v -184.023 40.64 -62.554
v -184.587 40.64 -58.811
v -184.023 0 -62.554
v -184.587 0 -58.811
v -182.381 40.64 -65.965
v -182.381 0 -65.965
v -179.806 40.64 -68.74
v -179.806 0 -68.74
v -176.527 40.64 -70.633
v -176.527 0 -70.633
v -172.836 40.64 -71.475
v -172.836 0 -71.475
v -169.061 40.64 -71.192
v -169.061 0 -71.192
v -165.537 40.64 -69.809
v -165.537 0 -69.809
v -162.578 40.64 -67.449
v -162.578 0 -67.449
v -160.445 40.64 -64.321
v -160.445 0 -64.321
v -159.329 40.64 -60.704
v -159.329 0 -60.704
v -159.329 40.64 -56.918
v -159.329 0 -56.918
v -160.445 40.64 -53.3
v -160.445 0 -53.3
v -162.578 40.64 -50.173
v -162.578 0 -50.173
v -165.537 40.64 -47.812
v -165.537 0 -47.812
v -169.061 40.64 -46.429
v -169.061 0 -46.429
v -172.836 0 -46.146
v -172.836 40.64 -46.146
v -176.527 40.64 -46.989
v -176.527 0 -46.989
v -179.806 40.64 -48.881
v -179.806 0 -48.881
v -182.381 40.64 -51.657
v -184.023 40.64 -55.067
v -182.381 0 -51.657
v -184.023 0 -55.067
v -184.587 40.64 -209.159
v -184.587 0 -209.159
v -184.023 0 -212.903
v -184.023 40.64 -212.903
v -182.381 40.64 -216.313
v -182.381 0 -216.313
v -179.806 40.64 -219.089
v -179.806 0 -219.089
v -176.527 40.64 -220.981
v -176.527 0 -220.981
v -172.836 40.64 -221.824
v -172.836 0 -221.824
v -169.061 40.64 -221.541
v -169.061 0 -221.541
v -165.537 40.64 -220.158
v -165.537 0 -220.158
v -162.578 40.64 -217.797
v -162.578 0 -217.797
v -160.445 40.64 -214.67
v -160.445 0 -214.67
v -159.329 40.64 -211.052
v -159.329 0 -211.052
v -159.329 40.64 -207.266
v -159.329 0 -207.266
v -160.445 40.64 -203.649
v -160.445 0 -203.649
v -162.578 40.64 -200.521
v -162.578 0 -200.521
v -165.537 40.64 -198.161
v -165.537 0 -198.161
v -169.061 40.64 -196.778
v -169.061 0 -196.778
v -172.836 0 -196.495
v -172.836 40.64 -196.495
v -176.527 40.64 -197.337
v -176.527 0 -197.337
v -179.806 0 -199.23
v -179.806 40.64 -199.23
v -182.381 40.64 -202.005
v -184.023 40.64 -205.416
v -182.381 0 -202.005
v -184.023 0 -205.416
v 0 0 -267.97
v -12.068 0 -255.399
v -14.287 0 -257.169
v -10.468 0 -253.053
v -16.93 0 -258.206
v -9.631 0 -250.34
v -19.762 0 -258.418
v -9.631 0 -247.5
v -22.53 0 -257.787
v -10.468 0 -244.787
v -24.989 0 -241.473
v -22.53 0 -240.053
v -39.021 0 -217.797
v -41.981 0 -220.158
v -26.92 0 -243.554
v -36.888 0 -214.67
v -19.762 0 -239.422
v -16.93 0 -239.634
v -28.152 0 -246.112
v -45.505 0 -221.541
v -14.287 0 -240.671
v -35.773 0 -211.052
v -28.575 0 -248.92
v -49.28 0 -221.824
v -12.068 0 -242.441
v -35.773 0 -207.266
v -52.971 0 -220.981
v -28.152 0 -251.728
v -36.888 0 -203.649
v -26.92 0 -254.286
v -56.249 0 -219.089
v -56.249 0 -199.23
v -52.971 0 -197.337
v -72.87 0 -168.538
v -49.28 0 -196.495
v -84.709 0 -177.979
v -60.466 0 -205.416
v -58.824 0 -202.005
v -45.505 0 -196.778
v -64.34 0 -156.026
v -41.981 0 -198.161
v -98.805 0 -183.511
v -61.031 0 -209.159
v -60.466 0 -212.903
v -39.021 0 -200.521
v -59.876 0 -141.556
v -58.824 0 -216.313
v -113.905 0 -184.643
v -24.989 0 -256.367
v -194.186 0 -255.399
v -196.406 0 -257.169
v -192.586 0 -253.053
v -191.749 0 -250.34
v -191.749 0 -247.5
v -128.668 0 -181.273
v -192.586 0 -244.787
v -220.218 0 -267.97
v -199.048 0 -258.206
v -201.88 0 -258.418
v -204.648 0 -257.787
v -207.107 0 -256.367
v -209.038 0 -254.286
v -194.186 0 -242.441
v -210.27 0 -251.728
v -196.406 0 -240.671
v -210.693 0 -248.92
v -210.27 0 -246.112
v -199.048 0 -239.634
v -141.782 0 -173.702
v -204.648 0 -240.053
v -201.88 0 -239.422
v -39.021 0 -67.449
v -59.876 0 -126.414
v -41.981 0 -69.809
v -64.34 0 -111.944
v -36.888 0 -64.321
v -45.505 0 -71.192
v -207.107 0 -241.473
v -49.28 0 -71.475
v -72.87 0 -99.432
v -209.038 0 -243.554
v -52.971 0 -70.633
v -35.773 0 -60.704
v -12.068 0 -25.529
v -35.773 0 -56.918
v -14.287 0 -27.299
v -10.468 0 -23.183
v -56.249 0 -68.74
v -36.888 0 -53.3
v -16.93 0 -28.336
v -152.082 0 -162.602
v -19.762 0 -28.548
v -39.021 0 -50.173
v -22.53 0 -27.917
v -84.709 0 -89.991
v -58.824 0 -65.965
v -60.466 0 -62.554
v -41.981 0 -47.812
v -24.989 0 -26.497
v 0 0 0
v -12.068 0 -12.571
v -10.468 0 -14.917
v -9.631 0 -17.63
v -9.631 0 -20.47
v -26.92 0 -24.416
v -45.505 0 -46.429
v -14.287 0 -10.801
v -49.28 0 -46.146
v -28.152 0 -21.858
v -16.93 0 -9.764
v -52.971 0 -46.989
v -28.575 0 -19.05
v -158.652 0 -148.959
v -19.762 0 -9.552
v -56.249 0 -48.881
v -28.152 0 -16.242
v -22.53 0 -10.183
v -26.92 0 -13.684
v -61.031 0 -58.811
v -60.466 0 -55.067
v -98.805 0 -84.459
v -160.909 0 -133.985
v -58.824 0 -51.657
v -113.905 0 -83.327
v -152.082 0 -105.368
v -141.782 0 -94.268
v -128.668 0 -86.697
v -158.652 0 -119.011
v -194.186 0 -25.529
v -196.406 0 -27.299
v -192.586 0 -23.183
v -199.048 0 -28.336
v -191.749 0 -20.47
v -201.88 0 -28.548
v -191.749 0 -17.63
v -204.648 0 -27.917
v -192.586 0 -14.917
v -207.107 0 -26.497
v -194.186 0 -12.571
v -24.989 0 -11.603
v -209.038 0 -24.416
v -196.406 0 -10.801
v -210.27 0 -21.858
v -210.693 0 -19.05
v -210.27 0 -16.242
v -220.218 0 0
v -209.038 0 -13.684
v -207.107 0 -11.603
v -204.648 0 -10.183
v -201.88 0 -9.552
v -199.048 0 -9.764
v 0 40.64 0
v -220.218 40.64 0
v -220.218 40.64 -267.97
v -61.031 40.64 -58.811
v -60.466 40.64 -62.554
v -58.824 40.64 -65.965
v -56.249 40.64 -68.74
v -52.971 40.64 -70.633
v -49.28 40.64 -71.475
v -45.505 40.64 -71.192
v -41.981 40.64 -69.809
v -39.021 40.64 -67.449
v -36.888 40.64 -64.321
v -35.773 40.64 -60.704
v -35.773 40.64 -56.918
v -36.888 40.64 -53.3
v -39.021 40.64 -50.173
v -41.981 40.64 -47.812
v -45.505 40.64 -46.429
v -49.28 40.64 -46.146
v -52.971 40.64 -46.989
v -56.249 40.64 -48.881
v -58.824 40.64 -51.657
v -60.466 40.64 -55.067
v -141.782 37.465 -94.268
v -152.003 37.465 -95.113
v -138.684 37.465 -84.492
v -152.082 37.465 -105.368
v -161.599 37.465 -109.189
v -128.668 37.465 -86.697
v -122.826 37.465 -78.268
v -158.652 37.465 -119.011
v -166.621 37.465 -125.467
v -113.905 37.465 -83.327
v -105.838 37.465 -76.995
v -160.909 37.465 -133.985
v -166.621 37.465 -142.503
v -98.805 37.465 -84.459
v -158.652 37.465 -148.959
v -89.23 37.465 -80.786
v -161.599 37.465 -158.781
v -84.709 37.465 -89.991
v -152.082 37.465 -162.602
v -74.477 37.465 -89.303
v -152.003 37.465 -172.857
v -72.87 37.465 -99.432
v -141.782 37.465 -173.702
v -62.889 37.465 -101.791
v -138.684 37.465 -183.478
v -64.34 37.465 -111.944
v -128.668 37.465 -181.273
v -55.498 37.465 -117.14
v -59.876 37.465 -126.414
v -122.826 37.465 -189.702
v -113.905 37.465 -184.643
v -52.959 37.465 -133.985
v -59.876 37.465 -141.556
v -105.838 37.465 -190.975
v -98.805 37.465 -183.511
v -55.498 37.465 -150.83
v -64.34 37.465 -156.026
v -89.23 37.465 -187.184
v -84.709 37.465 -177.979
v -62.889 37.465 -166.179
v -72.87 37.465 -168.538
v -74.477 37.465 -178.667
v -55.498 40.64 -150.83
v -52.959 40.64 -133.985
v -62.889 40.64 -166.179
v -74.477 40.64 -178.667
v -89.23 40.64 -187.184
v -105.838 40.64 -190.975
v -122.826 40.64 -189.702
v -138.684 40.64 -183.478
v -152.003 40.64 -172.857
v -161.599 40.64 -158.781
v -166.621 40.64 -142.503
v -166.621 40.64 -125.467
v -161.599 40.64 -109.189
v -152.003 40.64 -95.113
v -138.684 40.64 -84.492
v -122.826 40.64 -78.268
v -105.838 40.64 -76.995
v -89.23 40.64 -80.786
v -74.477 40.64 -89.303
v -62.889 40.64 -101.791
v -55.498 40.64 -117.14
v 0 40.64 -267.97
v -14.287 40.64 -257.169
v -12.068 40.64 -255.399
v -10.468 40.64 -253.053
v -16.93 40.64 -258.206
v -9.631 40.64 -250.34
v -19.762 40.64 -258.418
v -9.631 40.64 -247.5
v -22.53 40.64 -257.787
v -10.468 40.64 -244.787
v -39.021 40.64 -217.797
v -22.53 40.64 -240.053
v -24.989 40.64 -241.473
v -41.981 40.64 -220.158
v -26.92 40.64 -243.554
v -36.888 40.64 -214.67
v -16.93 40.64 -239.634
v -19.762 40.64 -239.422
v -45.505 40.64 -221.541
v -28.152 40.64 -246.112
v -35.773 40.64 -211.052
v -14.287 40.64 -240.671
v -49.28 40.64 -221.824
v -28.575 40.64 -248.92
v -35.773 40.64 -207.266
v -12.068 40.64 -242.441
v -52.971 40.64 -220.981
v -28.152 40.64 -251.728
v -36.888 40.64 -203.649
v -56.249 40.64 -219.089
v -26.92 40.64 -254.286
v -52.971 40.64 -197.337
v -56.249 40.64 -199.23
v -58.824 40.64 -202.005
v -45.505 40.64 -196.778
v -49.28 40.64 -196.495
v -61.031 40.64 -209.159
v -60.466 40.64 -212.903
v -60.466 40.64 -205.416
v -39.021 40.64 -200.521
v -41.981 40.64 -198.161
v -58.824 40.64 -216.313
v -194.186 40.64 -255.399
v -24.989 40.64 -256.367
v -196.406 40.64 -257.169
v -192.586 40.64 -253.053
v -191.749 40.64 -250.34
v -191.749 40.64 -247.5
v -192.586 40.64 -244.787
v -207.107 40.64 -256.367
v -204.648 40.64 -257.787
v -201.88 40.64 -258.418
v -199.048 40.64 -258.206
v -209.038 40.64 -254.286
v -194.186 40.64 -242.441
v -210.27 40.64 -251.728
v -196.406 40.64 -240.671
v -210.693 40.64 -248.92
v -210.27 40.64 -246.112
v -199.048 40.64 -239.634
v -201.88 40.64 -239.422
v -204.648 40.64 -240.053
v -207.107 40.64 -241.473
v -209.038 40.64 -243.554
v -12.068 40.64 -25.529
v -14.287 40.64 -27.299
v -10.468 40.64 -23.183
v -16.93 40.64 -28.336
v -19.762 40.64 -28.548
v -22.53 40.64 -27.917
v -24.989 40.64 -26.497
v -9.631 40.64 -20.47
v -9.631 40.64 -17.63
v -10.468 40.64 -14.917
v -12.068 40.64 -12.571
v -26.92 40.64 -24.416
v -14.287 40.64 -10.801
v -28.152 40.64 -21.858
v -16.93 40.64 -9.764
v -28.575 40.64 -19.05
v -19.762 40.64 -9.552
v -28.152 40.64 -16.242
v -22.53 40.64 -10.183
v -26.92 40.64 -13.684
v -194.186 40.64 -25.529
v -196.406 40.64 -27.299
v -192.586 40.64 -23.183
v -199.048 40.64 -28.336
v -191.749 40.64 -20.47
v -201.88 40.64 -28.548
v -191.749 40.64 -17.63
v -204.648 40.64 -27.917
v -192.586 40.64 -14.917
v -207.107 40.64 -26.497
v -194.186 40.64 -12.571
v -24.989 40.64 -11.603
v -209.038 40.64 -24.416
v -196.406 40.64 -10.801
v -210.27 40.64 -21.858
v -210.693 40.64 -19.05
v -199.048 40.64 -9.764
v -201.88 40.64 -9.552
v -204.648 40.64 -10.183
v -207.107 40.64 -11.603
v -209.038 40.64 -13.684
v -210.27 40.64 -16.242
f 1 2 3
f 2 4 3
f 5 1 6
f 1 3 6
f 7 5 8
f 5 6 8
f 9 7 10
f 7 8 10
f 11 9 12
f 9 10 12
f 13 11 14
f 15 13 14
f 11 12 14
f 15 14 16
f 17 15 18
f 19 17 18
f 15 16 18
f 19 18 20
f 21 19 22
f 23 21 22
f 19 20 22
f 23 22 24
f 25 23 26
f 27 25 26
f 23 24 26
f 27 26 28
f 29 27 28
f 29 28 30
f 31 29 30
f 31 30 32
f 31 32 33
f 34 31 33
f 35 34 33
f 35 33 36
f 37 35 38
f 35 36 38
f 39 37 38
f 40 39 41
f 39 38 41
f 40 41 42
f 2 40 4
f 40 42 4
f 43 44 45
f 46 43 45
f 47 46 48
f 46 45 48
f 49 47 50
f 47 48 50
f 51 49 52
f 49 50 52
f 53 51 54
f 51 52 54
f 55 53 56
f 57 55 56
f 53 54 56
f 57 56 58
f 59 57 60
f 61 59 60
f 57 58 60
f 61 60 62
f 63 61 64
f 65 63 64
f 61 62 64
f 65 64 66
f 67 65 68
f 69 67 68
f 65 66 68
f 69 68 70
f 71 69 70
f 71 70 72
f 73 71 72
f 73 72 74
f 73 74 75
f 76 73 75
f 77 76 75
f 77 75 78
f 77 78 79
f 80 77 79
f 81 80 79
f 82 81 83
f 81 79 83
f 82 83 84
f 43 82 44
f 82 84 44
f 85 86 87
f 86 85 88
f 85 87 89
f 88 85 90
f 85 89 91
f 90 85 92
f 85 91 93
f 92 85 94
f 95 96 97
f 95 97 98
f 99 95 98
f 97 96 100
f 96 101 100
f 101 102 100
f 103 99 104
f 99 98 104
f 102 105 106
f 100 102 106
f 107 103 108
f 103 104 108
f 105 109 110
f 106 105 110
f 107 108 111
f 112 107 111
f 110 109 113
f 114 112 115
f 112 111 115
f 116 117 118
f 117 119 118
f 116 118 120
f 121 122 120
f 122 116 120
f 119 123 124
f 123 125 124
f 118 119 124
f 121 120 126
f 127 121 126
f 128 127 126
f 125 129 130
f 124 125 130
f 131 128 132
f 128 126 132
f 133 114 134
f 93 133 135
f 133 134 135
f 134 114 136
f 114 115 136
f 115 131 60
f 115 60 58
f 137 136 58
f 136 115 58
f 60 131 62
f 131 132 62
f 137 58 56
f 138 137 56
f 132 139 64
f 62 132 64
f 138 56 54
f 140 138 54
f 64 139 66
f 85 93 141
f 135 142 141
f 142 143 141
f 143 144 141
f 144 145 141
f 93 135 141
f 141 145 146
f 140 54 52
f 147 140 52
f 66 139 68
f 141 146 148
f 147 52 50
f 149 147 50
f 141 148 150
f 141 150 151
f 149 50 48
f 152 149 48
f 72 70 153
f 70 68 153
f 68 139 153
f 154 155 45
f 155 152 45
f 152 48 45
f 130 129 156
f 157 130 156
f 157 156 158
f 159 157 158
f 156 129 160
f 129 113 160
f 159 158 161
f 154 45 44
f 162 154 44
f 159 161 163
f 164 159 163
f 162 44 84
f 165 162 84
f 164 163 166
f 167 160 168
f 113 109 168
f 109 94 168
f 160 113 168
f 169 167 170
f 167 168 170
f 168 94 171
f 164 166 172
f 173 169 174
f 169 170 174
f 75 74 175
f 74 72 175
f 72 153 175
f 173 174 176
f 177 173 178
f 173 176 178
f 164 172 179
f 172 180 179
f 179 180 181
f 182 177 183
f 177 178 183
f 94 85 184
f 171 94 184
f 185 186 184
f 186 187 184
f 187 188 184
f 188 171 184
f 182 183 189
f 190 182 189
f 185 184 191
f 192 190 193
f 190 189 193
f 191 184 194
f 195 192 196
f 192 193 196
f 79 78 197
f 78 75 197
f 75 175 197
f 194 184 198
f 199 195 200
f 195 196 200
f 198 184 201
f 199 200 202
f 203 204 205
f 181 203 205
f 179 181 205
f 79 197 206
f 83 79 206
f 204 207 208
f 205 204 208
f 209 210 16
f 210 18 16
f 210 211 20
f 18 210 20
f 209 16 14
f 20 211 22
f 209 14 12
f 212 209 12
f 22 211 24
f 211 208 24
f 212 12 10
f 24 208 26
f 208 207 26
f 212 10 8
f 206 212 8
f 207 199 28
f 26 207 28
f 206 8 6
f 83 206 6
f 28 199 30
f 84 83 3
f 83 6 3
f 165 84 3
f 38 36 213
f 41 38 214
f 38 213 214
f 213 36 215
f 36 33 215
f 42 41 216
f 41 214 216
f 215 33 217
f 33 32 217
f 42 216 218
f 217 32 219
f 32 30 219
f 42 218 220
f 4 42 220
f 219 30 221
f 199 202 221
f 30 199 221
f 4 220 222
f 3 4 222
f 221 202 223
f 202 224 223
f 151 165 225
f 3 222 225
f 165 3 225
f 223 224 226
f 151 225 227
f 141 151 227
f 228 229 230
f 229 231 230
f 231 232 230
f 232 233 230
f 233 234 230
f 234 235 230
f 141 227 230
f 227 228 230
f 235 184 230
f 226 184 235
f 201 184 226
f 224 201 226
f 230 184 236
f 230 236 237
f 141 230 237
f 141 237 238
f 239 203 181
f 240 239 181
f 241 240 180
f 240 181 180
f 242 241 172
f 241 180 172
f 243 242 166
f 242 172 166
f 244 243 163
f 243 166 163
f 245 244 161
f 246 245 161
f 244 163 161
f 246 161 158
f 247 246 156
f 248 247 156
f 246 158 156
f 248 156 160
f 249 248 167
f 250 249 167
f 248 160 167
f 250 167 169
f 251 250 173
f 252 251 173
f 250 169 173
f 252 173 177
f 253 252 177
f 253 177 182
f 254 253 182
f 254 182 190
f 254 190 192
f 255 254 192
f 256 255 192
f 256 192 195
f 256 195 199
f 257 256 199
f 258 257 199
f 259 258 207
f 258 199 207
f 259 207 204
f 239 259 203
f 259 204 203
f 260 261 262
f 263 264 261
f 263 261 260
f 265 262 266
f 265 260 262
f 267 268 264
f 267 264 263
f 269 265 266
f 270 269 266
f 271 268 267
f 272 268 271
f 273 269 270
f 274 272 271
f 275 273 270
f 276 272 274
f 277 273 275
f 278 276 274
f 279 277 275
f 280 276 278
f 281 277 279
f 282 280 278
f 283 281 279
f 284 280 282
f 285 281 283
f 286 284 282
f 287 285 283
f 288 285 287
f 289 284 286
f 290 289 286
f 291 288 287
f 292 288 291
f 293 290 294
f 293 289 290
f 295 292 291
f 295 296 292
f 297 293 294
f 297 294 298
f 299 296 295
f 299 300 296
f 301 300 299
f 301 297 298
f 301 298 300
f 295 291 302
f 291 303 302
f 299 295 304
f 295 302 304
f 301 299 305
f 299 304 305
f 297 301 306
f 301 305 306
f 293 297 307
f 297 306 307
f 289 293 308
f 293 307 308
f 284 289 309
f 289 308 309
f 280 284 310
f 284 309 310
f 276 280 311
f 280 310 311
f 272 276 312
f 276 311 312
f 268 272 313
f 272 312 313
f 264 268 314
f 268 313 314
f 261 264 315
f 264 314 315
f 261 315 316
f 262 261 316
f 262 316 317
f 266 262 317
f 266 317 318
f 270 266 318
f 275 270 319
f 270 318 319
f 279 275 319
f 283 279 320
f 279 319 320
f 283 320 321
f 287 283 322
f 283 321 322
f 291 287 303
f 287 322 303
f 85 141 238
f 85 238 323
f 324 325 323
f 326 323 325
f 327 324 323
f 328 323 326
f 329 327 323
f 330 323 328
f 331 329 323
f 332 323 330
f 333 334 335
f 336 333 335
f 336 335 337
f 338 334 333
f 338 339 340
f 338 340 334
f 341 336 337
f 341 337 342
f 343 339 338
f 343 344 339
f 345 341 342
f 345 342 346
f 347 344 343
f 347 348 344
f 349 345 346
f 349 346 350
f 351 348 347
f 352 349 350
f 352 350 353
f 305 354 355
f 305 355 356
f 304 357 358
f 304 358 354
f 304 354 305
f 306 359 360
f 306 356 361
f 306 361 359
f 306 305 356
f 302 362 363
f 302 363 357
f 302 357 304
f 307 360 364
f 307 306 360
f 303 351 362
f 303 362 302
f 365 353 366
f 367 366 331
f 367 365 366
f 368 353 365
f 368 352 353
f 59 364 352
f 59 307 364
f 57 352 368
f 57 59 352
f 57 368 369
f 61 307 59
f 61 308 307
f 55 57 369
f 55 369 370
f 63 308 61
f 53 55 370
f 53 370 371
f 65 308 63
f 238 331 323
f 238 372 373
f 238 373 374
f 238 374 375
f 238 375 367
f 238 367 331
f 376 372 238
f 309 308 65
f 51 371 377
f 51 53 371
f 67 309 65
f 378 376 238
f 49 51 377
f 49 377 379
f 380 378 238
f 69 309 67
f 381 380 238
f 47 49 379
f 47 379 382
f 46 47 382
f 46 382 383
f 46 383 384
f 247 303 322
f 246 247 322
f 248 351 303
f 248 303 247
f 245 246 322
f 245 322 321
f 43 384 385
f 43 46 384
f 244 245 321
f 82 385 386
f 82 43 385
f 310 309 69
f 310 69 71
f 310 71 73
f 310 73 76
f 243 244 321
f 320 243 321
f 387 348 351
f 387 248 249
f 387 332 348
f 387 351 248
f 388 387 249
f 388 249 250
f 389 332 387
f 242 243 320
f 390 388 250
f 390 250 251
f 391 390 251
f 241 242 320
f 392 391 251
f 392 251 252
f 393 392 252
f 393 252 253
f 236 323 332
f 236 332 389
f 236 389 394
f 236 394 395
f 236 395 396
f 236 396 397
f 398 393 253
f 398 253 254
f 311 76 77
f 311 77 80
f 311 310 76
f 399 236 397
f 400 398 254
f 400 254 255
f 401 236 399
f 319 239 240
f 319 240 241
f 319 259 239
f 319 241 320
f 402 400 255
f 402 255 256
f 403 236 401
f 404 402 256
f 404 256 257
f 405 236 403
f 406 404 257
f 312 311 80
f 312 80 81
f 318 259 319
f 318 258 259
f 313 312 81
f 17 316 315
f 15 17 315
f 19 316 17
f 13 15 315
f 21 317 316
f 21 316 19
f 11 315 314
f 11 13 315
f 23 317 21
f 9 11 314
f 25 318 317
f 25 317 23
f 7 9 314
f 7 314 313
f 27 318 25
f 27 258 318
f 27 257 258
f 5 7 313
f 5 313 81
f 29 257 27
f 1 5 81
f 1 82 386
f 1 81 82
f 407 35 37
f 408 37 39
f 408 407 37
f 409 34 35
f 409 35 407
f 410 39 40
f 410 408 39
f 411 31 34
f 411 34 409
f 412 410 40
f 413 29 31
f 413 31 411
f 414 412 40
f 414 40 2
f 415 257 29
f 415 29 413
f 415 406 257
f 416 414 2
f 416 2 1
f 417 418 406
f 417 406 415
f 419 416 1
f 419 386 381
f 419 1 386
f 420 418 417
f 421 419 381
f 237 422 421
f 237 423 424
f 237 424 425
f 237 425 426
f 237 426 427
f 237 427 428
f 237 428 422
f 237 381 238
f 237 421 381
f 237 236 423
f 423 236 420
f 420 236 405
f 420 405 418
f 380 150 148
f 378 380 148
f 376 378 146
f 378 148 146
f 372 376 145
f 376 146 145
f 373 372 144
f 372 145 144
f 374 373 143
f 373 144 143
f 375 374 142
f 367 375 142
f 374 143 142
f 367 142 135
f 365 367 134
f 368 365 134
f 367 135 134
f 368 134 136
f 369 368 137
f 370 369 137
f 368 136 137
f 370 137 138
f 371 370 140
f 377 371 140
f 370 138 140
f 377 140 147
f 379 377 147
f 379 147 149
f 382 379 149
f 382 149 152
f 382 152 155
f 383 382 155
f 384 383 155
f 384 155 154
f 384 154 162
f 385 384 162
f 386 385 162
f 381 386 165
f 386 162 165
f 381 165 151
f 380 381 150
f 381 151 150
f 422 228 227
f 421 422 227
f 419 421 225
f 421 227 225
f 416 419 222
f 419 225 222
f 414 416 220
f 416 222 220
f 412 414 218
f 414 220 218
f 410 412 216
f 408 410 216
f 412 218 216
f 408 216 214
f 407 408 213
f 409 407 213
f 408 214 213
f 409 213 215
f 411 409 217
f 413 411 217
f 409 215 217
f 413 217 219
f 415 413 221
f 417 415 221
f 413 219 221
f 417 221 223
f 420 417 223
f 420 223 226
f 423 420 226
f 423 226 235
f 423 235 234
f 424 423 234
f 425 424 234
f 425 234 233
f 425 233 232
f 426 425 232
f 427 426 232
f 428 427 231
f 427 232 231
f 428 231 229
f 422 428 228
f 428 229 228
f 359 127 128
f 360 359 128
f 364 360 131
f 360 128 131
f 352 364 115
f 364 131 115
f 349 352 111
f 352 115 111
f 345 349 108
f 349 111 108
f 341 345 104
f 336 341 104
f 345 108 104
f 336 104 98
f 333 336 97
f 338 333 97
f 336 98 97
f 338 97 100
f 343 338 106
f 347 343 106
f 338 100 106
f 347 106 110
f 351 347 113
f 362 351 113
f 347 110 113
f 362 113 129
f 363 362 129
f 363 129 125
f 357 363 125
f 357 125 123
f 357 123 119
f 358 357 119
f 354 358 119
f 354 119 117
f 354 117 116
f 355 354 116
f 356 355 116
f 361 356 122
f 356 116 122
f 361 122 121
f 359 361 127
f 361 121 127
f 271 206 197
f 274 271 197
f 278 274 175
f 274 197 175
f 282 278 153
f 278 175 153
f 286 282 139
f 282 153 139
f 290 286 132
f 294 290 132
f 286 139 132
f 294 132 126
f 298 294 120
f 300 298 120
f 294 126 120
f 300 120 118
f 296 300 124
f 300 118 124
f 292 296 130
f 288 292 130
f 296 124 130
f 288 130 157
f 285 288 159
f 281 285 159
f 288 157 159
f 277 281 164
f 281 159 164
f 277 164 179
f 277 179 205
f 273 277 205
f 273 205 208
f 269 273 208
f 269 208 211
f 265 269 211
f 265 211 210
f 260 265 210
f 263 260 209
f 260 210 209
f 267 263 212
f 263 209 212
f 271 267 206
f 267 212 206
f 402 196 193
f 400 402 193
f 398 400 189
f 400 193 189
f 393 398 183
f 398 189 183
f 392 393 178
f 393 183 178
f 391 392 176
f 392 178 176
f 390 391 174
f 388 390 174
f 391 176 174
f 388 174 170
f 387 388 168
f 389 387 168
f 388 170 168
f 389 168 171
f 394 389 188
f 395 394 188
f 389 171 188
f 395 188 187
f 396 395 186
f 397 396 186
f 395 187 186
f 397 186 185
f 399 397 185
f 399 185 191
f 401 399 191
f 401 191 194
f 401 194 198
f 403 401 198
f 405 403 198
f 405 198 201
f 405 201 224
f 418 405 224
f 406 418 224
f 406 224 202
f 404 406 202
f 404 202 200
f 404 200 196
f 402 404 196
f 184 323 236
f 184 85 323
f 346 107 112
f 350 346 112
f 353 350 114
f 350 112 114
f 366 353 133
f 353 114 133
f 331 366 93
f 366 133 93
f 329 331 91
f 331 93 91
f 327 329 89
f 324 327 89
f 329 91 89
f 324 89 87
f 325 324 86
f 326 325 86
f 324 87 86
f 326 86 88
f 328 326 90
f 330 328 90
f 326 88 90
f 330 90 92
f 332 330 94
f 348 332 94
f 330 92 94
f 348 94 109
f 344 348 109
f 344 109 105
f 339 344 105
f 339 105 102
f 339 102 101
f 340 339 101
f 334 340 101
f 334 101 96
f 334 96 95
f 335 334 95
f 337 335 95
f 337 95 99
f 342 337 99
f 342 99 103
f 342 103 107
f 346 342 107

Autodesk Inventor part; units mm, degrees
ref_plane "YZ Plane" through (0, 0, 0) normal (1, 0, 0) x (0, 1, 0)
ref_plane "XZ Plane" through (0, 0, 0) normal (0, 1, 0) x (-1, 0, 0)
ref_plane "XY Plane" through (0, 0, 0) normal (0, 0, 1) x (1, 0, 0)
sketch "Sketch1" plane through (0, 0, 0) normal (0, 1, 0) x (-1, 0, 0)
  line L0 (0, 0) -> (220.218, 0)
  line L1 (220.218, 0) -> (220.218, -267.97)
  line L2 (220.218, -267.97) -> (0, -267.97)
  line L3 (0, -267.97) -> (0, 0)
  circle A0 centre (110.109, -133.985) radius 57.15
  circle A1 centre (110.109, -133.985) radius 50.8
  line L4 (220.218, 0) -> (220.218, -25.4)
  line L5 (220.218, -133.985) -> (0, -133.985)
  line L6 (110.109, 0) -> (110.109, -267.97)
  line L7 (0, 0) -> (220.218, -267.97)
  line L8 (220.218, 0) -> (0, -267.97)
  line L9 (189.915, -36.8739) -> (146.3942, -89.8318)
  line L10 (220.218, -133.985) -> (167.259, -133.985)
  circle A2 centre (201.168, -248.92) radius 9.525
  circle A3 centre (201.168, -19.05) radius 9.525
  circle A4 centre (19.05, -248.92) radius 9.525
  circle A5 centre (19.05, -19.05) radius 9.525
  circle A6 centre (171.8873, -209.1593) radius 34.925
  circle A7 centre (48.3307, -209.1593) radius 34.925
  circle A8 centre (171.8873, -58.8107) radius 34.925
  circle A9 centre (48.3307, -58.8107) radius 34.925
  circle A10 centre (171.8873, -58.8107) radius 12.7
  circle A11 centre (171.8873, -209.1593) radius 12.7
  circle A12 centre (48.3307, -209.1593) radius 12.7
  circle A13 centre (48.3307, -58.8107) radius 12.7
  dimension "d0" = 220.218
  dimension "d1" = 267.97
  dimension "d11" = 114.3
  dimension "d12" = 101.6
  dimension "d40" = 69.85
  dimension "d41" = 25.4
  dimension "d42" = 25.4
extrude "Extrusion3" add sketch "Sketch1" along normal blind 40.64
extrude "Extrusion4" cut sketch "Sketch1" along normal blind 40.64 contours L6 L7 A1 | A1 L8 L6 | L5 L8 A1 | A1 L7 L5 | A1 L5 L8 | L7 A1 L6 | L5 A1 L7 | L6 A1 L8
sketch "Sketch3" plane through (0, 40.64, 0) normal (0, 1, 0) x (1, 0, 0)
  line L0 (0, 267.97) -> (-220.218, 267.97) projected
  line L1 (-220.218, 0) -> (0, 0) projected
  circle A0 centre (-110.109, 133.985) radius 57.15
  dimension "d21" = 114.3
extrude "Extrusion6" cut sketch "Sketch3" against normal blind 3.175
extrude "Extrusion8" cut sketch "Sketch1" along normal blind 87.3125 contours A5 L7 | L7 A5 | A3 L8 | L8 A3 | A4 L8 | L8 A4 | A2 L7 | L7 A2
extrude "Extrusion9" cut sketch "Sketch1" along normal blind 96.8375 contours A13 L7 | L7 A13 | A10 L8 | L8 A10 | A12 L8 | L8 A12 | A11 L7 | L7 A11
properties part number "Wash_Base_Middle"
